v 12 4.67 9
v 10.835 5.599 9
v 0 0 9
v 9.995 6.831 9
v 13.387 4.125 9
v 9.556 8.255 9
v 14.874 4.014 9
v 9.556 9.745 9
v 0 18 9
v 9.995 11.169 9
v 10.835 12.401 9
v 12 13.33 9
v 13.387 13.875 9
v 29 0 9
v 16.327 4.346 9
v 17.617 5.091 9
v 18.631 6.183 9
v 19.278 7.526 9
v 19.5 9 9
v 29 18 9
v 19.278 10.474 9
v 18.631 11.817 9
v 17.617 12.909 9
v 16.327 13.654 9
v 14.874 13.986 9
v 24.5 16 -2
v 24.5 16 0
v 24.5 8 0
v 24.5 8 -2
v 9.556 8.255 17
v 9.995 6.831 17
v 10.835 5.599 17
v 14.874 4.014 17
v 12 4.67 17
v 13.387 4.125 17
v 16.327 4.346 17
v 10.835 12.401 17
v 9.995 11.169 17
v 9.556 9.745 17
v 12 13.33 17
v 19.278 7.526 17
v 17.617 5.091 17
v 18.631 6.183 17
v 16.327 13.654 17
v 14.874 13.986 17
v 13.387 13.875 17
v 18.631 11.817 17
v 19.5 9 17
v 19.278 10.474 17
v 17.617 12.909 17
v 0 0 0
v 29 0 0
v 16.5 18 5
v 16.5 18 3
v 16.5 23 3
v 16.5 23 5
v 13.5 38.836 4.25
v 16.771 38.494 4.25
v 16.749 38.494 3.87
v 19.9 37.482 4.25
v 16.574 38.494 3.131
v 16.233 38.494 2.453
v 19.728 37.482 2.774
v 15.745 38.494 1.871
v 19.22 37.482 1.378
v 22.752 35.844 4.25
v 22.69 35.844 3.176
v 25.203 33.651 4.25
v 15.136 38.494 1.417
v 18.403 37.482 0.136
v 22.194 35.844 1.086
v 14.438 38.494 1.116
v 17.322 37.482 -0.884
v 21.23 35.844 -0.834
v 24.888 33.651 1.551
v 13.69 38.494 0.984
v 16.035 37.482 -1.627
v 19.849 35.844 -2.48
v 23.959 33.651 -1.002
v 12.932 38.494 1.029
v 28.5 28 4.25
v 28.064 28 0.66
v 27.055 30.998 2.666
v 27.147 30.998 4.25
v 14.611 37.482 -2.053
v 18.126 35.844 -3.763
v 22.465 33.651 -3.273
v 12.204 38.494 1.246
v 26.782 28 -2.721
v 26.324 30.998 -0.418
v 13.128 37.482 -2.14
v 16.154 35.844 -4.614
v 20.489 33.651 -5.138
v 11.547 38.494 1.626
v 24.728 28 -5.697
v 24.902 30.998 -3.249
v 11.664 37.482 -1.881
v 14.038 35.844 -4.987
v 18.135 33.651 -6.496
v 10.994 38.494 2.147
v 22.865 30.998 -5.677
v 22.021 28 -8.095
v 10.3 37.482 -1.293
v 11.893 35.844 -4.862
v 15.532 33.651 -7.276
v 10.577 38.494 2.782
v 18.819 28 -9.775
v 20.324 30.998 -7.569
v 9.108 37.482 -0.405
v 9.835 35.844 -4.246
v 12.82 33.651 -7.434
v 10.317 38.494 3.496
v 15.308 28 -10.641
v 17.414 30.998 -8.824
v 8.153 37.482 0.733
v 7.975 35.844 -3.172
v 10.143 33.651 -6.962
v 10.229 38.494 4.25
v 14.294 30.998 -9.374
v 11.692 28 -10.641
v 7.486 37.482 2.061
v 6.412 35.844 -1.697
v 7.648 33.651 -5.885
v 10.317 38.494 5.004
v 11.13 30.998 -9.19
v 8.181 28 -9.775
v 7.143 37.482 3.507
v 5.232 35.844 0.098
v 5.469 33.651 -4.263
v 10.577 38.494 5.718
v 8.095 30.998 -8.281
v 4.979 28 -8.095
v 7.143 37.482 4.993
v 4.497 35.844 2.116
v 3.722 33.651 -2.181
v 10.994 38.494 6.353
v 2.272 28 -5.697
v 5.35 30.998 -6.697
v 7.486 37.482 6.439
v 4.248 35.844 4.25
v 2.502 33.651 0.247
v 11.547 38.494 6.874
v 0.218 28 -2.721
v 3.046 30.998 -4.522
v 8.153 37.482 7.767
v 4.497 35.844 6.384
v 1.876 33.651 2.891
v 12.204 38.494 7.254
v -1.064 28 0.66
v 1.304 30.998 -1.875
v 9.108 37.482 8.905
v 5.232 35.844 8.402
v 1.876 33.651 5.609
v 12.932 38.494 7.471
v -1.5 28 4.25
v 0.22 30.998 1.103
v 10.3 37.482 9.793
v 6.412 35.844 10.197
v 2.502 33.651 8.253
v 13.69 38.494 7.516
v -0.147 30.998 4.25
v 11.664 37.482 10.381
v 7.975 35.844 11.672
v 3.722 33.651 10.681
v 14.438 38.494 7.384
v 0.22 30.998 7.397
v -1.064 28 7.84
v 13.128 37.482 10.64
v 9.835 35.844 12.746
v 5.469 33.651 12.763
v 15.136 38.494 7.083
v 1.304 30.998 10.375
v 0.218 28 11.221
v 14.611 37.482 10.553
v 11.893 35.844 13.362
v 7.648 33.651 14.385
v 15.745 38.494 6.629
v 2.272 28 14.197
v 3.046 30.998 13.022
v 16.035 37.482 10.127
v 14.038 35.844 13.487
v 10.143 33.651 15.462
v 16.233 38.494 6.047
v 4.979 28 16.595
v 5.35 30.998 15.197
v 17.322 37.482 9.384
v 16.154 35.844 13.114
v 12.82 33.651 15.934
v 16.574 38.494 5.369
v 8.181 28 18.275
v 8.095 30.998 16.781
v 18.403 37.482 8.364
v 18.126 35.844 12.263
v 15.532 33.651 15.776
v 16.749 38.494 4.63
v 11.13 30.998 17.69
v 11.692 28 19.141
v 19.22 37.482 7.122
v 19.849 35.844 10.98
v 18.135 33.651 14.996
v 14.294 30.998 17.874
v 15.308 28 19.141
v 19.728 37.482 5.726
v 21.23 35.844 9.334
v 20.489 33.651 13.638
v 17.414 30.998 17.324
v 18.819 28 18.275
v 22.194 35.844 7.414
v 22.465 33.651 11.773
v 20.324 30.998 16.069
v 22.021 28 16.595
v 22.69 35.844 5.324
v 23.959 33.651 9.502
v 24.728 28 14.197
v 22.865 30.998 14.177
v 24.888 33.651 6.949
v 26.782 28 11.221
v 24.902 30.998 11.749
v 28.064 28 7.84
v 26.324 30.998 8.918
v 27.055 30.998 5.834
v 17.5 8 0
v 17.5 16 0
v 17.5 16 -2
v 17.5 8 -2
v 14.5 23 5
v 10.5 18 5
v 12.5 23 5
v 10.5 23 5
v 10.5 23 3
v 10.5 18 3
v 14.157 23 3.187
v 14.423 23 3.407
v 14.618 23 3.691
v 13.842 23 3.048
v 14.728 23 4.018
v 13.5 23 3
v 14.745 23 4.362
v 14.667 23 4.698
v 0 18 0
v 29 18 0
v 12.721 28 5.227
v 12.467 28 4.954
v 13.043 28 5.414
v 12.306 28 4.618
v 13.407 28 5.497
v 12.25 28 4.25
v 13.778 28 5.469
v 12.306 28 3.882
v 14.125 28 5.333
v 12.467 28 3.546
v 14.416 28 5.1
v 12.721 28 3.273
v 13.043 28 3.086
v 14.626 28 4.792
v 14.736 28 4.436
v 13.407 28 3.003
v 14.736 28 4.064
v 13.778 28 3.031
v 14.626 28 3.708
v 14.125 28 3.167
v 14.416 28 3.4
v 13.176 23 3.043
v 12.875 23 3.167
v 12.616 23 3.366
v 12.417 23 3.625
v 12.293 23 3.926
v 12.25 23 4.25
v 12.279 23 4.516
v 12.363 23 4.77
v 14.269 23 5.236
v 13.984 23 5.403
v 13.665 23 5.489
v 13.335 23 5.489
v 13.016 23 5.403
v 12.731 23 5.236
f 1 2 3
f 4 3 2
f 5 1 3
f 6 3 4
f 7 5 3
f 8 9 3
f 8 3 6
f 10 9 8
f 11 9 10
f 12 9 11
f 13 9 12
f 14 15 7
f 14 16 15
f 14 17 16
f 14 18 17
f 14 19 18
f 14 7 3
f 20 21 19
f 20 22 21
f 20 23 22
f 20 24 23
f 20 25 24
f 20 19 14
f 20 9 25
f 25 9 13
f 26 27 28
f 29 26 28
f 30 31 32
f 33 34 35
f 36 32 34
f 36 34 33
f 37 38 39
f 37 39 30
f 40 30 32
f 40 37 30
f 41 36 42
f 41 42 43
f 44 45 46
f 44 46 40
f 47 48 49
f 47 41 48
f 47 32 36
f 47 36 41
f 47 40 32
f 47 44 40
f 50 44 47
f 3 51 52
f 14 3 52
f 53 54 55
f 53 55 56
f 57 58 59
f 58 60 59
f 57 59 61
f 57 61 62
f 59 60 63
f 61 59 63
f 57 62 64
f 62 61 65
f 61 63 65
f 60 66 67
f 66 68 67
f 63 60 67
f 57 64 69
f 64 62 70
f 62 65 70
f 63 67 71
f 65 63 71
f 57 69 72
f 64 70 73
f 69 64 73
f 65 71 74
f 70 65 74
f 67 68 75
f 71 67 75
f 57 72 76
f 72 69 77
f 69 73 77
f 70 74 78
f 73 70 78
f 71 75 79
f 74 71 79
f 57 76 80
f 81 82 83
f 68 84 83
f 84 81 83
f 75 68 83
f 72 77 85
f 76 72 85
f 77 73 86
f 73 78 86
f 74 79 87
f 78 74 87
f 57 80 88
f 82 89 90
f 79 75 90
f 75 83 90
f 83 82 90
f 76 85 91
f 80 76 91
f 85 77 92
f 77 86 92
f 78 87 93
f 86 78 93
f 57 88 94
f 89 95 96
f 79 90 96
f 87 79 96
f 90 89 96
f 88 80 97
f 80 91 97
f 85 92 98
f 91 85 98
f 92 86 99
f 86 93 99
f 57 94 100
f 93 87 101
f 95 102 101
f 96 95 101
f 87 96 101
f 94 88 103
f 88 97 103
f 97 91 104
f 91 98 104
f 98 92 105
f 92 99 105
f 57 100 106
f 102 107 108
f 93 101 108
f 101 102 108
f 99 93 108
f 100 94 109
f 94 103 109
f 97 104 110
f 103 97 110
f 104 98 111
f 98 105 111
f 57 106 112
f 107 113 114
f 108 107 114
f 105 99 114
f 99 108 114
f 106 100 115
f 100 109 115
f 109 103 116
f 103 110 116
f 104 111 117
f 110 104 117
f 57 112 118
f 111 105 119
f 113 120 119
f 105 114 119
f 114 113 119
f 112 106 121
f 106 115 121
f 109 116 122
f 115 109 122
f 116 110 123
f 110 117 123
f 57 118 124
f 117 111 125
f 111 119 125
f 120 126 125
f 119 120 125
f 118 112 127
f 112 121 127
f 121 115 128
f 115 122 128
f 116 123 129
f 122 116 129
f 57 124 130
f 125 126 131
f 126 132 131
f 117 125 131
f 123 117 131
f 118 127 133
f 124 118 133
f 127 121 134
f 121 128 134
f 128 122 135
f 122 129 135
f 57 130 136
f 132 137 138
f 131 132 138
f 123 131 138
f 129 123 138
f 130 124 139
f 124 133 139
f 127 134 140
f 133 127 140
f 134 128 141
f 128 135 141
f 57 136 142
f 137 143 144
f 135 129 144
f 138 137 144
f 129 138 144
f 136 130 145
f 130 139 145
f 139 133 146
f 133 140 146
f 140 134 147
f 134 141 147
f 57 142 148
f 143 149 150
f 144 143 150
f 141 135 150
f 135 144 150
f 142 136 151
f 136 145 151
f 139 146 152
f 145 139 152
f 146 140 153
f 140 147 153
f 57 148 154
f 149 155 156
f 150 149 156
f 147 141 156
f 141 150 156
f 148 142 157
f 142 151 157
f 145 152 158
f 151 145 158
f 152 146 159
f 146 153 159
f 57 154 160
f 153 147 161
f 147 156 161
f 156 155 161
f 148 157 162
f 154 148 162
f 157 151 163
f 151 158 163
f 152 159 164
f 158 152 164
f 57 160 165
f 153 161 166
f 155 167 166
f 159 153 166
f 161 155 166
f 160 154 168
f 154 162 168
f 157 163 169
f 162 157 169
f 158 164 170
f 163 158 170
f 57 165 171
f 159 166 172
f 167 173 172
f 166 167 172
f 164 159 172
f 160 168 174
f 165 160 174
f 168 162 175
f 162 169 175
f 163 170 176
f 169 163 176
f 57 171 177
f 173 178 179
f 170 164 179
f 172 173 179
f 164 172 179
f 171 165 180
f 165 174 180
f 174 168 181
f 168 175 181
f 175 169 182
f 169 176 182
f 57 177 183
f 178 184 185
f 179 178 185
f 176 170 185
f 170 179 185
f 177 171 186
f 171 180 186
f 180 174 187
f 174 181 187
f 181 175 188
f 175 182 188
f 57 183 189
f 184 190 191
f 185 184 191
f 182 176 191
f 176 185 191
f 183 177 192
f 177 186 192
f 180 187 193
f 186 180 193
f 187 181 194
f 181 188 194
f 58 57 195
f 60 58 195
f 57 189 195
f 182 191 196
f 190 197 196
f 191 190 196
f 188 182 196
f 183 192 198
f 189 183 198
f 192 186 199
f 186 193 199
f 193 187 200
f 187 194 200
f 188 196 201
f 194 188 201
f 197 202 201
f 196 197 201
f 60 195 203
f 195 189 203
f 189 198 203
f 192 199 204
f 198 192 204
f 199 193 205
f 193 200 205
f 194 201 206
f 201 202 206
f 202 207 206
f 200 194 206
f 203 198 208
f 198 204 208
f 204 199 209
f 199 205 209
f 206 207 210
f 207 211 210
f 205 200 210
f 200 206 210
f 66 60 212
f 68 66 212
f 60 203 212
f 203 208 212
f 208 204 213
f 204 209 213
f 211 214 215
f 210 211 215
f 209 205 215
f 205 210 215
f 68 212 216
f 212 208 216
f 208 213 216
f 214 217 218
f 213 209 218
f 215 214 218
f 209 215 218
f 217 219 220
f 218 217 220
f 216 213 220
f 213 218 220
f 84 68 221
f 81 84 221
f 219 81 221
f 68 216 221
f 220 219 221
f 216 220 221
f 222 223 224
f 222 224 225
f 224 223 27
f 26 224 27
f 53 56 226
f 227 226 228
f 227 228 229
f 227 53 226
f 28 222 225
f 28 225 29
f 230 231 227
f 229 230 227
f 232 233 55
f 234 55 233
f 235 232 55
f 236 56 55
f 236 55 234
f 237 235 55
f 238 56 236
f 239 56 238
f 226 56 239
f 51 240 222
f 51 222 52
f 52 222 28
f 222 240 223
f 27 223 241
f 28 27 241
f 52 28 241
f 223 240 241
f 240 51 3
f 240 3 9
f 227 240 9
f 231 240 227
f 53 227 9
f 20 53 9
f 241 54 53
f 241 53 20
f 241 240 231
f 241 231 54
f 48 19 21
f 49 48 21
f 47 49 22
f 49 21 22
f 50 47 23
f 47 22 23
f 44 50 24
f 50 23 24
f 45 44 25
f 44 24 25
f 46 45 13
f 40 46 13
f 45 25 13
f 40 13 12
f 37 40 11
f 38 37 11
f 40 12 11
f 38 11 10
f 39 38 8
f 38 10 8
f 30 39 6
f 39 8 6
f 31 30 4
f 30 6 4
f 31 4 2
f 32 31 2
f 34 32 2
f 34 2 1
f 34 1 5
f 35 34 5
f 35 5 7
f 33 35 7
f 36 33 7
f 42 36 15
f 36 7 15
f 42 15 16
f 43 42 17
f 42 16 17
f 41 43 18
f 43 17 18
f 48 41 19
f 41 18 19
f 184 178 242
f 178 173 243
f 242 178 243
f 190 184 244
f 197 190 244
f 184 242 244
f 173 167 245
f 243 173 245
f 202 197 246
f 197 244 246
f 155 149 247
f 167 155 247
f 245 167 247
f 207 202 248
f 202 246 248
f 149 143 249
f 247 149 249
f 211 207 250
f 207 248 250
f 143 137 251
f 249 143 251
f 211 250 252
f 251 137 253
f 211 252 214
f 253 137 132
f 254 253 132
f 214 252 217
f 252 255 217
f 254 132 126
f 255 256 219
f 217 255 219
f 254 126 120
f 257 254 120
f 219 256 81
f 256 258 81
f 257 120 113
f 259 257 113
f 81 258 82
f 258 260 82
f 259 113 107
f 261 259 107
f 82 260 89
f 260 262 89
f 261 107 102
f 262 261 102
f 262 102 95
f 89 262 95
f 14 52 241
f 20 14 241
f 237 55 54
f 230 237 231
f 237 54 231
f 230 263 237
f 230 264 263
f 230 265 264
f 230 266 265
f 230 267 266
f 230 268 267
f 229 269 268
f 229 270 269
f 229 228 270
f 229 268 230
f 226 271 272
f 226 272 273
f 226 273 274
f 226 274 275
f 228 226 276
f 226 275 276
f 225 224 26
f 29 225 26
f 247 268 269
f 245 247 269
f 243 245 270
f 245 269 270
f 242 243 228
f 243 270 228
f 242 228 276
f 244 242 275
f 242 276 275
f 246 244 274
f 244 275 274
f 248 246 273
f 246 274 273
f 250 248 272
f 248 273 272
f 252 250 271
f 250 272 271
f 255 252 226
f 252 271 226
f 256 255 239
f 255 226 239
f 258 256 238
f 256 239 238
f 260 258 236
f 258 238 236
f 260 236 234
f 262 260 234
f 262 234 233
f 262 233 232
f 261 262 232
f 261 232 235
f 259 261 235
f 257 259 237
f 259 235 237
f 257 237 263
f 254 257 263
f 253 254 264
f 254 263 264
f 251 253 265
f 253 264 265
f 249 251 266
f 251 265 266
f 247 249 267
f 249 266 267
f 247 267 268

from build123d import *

# Parameters (mm, degrees)
F0_W     = 29
F0_H     = 18
F1_DEPTH = 9
F2_R     = 5
F3_DEPTH = 8
F4_W     = 7
F4_H     = 8
F5_DEPTH = 2
F6_W     = 6
F6_H     = 2
F7_DEPTH = 5
F8_R     = 1.25
F9_DEPTH = 5


with BuildPart() as f1:
    # F0 (on Top) → F1 (new body)
    with BuildSketch(Plane.XY):
        with Locations((14.5, 9)):
            Rectangle(F0_W, F0_H)
    extrude(amount=F1_DEPTH)

    # F2 (on face) → F3 (join)
    with BuildSketch(Plane.XY.offset(9)):
        with Locations((14.5, 9)):
            Circle(F2_R)
    extrude(amount=F3_DEPTH)

    # F4 (on face) → F5 (join)
    with BuildSketch(Plane(origin=(0, 0, 0), x_dir=(1, 0, 0), z_dir=(0, 0, -1))):
        with Locations((21, -12)):
            Rectangle(F4_W, F4_H)
    extrude(amount=F5_DEPTH)

    # F6 (on face) → F7 (join)
    with BuildSketch(Plane(origin=(0, 18, 0), x_dir=(-1, 0, 0), z_dir=(0, 1, 0))):
        with Locations((-13.5, 4)):
            Rectangle(F6_W, F6_H)
    extrude(amount=F7_DEPTH)

    # F8 (on face) → F9 (join)
    with BuildSketch(Plane(origin=(0, 23, 0), x_dir=(-1, 0, 0), z_dir=(0, 1, 0))):
        with Locations((-13.5, 4.25)):
            Circle(F8_R)
    extrude(amount=F9_DEPTH)

    # F12 (on plane+point) → F13 (revolve)
    with BuildSketch(Plane(origin=(0, 0, 4.25), x_dir=(1, 0, 0), z_dir=(0, 0, -1))):
        with BuildLine():
            Line((28.5, -28), (14.75, -28))
            Line((14.75, -28), (13.5, -28))
            Line((13.5, -28), (13.5, -38.8361305416))
            ThreePointArc((13.5, -38.8361305416), (22.7523203186, -35.8437286272), (28.5, -28))
        make_face()
    revolve(axis=Axis((13.5, 35.315773949, 4.25), (0, 1, 0)))


solid = f1.part
